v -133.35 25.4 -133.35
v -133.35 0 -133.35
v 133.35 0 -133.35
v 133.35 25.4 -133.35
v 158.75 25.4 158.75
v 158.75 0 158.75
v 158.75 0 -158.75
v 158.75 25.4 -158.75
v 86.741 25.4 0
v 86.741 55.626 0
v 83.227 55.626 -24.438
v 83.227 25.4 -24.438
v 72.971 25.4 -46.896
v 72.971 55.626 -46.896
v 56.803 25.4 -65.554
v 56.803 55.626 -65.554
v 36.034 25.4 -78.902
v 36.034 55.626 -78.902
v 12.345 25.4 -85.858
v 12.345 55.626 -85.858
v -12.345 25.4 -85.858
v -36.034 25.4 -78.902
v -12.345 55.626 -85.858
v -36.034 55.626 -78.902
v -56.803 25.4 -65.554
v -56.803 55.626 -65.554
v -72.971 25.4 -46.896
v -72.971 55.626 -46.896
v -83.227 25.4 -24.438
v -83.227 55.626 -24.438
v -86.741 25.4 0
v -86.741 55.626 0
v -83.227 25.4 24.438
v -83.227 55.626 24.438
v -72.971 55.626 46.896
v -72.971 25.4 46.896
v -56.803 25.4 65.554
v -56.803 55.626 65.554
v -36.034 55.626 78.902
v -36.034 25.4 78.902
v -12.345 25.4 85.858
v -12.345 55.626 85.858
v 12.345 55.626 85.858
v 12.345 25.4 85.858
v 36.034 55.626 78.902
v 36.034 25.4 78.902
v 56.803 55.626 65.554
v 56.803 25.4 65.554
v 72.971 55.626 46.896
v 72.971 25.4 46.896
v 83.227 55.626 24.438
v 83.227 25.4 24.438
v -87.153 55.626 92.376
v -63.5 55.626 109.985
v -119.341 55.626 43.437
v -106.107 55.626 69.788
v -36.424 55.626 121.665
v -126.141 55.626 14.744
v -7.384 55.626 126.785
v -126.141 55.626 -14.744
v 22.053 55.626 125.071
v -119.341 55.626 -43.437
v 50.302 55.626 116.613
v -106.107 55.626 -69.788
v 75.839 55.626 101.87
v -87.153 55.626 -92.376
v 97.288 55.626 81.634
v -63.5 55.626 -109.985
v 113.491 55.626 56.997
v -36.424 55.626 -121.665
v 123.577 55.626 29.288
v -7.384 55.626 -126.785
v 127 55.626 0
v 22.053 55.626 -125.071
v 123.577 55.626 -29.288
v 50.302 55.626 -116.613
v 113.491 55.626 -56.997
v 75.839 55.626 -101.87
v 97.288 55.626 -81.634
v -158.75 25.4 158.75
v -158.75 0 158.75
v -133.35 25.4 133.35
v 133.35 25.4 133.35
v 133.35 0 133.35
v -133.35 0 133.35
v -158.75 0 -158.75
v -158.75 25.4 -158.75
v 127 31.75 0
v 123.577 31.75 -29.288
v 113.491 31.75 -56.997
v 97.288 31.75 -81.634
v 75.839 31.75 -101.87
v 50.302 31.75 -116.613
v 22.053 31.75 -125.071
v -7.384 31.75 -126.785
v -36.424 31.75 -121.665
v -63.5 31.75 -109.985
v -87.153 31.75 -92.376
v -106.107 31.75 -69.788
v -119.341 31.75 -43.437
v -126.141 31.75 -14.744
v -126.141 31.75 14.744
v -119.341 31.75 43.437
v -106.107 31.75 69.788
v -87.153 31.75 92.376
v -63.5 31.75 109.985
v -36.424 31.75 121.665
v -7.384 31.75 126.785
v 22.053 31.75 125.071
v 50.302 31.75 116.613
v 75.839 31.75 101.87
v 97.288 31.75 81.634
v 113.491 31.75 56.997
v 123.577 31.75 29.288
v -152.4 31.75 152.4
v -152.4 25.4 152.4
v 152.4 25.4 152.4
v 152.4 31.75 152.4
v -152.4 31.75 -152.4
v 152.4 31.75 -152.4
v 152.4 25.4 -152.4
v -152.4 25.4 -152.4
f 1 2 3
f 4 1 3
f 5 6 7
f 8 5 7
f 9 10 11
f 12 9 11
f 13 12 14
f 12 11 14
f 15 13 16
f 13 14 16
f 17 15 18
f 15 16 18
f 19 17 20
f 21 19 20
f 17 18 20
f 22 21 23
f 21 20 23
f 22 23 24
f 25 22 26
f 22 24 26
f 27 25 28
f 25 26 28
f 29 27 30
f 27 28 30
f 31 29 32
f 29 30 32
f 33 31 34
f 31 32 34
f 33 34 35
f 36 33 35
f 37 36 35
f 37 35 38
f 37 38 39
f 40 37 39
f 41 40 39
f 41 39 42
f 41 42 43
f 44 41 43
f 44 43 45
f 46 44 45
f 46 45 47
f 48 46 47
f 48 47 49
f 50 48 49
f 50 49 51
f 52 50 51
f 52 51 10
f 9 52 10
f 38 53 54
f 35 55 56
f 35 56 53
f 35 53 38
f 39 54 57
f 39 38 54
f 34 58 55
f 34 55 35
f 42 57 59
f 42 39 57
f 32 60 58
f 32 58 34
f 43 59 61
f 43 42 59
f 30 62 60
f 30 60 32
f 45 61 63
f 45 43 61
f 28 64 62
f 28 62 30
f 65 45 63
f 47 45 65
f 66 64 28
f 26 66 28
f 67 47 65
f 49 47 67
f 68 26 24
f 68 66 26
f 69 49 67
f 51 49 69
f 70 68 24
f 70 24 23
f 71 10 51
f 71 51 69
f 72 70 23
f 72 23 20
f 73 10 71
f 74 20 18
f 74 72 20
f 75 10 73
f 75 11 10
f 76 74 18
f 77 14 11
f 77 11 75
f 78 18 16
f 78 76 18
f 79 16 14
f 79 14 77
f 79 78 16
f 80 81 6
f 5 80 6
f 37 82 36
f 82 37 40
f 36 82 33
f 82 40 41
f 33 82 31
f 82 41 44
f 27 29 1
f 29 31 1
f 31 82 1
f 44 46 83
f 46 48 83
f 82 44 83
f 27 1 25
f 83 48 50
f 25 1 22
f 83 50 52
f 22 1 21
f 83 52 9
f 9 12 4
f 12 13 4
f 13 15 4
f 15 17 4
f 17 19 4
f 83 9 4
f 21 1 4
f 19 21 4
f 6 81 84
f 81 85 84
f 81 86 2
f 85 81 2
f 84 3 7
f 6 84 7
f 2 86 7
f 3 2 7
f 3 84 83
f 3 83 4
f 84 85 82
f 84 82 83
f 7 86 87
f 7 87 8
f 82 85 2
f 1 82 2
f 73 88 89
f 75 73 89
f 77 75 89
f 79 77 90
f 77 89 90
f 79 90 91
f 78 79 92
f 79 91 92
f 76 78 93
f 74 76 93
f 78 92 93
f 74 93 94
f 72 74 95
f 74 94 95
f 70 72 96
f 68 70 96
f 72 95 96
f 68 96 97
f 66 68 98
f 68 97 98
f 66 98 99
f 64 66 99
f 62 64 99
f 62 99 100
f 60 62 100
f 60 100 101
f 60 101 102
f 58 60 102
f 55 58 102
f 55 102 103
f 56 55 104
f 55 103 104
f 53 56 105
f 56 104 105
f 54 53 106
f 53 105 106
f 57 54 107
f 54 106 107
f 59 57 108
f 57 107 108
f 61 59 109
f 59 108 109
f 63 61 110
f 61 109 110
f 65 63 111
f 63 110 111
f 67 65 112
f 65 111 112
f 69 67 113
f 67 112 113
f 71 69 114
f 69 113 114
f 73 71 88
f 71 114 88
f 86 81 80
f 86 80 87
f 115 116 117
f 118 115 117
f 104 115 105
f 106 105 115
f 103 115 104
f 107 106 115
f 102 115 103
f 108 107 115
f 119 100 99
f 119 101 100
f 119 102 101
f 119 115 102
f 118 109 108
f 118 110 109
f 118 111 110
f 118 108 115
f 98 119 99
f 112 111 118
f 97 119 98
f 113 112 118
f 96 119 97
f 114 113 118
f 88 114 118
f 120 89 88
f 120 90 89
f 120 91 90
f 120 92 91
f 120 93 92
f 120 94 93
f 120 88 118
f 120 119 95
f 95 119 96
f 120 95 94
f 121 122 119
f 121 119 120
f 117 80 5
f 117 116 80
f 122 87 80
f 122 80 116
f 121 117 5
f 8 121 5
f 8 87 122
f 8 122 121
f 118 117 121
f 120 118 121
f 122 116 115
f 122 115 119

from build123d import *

# Parameters (mm, degrees)
SKETCH1_W           = 317.5
SKETCH1_H           = 317.5
SKETCH1_W_2         = 266.7
SKETCH1_H_2         = 266.7
BOSS_EXTRUDE1_DEPTH = 25.4
SKETCH2_W           = 304.8
SKETCH2_H           = 304.8
BOSS_EXTRUDE2_DEPTH = 6.35
SKETCH3_R           = 127
BOSS_EXTRUDE3_DEPTH = 23.876
SKETCH4_R           = 86.741
CUT_EXTRUDE1_DEPTH  = 56.626


with BuildPart() as part:
    # Sketch1 → Boss-Extrude1 (new body)
    with BuildSketch(Plane(origin=(0, 0, 0), x_dir=(1, 0, 0), z_dir=(0, 1, 0))):
        Rectangle(SKETCH1_W, SKETCH1_H)
        Rectangle(SKETCH1_W_2, SKETCH1_H_2, mode=Mode.SUBTRACT)
    extrude(amount=BOSS_EXTRUDE1_DEPTH)

    # Sketch2 → Boss-Extrude2 (add)
    with BuildSketch(Plane(origin=(0, 25.4, 0), x_dir=(1, 0, 0), z_dir=(0, 1, 0))):
        Rectangle(SKETCH2_W, SKETCH2_H)
    extrude(amount=BOSS_EXTRUDE2_DEPTH)

    # Sketch3 → Boss-Extrude3 (add)
    with BuildSketch(Plane(origin=(0, 31.75, 0), x_dir=(1, 0, 0), z_dir=(0, 1, 0))):
        Circle(SKETCH3_R)
    extrude(amount=BOSS_EXTRUDE3_DEPTH)

    # Sketch4 → Cut-Extrude1 (cut, through all)
    with BuildSketch(Plane(origin=(0, 55.626, 0), x_dir=(1, 0, 0), z_dir=(0, 1, 0))):
        Circle(SKETCH4_R)
    extrude(amount=-CUT_EXTRUDE1_DEPTH, mode=Mode.SUBTRACT)


solid = part.part
